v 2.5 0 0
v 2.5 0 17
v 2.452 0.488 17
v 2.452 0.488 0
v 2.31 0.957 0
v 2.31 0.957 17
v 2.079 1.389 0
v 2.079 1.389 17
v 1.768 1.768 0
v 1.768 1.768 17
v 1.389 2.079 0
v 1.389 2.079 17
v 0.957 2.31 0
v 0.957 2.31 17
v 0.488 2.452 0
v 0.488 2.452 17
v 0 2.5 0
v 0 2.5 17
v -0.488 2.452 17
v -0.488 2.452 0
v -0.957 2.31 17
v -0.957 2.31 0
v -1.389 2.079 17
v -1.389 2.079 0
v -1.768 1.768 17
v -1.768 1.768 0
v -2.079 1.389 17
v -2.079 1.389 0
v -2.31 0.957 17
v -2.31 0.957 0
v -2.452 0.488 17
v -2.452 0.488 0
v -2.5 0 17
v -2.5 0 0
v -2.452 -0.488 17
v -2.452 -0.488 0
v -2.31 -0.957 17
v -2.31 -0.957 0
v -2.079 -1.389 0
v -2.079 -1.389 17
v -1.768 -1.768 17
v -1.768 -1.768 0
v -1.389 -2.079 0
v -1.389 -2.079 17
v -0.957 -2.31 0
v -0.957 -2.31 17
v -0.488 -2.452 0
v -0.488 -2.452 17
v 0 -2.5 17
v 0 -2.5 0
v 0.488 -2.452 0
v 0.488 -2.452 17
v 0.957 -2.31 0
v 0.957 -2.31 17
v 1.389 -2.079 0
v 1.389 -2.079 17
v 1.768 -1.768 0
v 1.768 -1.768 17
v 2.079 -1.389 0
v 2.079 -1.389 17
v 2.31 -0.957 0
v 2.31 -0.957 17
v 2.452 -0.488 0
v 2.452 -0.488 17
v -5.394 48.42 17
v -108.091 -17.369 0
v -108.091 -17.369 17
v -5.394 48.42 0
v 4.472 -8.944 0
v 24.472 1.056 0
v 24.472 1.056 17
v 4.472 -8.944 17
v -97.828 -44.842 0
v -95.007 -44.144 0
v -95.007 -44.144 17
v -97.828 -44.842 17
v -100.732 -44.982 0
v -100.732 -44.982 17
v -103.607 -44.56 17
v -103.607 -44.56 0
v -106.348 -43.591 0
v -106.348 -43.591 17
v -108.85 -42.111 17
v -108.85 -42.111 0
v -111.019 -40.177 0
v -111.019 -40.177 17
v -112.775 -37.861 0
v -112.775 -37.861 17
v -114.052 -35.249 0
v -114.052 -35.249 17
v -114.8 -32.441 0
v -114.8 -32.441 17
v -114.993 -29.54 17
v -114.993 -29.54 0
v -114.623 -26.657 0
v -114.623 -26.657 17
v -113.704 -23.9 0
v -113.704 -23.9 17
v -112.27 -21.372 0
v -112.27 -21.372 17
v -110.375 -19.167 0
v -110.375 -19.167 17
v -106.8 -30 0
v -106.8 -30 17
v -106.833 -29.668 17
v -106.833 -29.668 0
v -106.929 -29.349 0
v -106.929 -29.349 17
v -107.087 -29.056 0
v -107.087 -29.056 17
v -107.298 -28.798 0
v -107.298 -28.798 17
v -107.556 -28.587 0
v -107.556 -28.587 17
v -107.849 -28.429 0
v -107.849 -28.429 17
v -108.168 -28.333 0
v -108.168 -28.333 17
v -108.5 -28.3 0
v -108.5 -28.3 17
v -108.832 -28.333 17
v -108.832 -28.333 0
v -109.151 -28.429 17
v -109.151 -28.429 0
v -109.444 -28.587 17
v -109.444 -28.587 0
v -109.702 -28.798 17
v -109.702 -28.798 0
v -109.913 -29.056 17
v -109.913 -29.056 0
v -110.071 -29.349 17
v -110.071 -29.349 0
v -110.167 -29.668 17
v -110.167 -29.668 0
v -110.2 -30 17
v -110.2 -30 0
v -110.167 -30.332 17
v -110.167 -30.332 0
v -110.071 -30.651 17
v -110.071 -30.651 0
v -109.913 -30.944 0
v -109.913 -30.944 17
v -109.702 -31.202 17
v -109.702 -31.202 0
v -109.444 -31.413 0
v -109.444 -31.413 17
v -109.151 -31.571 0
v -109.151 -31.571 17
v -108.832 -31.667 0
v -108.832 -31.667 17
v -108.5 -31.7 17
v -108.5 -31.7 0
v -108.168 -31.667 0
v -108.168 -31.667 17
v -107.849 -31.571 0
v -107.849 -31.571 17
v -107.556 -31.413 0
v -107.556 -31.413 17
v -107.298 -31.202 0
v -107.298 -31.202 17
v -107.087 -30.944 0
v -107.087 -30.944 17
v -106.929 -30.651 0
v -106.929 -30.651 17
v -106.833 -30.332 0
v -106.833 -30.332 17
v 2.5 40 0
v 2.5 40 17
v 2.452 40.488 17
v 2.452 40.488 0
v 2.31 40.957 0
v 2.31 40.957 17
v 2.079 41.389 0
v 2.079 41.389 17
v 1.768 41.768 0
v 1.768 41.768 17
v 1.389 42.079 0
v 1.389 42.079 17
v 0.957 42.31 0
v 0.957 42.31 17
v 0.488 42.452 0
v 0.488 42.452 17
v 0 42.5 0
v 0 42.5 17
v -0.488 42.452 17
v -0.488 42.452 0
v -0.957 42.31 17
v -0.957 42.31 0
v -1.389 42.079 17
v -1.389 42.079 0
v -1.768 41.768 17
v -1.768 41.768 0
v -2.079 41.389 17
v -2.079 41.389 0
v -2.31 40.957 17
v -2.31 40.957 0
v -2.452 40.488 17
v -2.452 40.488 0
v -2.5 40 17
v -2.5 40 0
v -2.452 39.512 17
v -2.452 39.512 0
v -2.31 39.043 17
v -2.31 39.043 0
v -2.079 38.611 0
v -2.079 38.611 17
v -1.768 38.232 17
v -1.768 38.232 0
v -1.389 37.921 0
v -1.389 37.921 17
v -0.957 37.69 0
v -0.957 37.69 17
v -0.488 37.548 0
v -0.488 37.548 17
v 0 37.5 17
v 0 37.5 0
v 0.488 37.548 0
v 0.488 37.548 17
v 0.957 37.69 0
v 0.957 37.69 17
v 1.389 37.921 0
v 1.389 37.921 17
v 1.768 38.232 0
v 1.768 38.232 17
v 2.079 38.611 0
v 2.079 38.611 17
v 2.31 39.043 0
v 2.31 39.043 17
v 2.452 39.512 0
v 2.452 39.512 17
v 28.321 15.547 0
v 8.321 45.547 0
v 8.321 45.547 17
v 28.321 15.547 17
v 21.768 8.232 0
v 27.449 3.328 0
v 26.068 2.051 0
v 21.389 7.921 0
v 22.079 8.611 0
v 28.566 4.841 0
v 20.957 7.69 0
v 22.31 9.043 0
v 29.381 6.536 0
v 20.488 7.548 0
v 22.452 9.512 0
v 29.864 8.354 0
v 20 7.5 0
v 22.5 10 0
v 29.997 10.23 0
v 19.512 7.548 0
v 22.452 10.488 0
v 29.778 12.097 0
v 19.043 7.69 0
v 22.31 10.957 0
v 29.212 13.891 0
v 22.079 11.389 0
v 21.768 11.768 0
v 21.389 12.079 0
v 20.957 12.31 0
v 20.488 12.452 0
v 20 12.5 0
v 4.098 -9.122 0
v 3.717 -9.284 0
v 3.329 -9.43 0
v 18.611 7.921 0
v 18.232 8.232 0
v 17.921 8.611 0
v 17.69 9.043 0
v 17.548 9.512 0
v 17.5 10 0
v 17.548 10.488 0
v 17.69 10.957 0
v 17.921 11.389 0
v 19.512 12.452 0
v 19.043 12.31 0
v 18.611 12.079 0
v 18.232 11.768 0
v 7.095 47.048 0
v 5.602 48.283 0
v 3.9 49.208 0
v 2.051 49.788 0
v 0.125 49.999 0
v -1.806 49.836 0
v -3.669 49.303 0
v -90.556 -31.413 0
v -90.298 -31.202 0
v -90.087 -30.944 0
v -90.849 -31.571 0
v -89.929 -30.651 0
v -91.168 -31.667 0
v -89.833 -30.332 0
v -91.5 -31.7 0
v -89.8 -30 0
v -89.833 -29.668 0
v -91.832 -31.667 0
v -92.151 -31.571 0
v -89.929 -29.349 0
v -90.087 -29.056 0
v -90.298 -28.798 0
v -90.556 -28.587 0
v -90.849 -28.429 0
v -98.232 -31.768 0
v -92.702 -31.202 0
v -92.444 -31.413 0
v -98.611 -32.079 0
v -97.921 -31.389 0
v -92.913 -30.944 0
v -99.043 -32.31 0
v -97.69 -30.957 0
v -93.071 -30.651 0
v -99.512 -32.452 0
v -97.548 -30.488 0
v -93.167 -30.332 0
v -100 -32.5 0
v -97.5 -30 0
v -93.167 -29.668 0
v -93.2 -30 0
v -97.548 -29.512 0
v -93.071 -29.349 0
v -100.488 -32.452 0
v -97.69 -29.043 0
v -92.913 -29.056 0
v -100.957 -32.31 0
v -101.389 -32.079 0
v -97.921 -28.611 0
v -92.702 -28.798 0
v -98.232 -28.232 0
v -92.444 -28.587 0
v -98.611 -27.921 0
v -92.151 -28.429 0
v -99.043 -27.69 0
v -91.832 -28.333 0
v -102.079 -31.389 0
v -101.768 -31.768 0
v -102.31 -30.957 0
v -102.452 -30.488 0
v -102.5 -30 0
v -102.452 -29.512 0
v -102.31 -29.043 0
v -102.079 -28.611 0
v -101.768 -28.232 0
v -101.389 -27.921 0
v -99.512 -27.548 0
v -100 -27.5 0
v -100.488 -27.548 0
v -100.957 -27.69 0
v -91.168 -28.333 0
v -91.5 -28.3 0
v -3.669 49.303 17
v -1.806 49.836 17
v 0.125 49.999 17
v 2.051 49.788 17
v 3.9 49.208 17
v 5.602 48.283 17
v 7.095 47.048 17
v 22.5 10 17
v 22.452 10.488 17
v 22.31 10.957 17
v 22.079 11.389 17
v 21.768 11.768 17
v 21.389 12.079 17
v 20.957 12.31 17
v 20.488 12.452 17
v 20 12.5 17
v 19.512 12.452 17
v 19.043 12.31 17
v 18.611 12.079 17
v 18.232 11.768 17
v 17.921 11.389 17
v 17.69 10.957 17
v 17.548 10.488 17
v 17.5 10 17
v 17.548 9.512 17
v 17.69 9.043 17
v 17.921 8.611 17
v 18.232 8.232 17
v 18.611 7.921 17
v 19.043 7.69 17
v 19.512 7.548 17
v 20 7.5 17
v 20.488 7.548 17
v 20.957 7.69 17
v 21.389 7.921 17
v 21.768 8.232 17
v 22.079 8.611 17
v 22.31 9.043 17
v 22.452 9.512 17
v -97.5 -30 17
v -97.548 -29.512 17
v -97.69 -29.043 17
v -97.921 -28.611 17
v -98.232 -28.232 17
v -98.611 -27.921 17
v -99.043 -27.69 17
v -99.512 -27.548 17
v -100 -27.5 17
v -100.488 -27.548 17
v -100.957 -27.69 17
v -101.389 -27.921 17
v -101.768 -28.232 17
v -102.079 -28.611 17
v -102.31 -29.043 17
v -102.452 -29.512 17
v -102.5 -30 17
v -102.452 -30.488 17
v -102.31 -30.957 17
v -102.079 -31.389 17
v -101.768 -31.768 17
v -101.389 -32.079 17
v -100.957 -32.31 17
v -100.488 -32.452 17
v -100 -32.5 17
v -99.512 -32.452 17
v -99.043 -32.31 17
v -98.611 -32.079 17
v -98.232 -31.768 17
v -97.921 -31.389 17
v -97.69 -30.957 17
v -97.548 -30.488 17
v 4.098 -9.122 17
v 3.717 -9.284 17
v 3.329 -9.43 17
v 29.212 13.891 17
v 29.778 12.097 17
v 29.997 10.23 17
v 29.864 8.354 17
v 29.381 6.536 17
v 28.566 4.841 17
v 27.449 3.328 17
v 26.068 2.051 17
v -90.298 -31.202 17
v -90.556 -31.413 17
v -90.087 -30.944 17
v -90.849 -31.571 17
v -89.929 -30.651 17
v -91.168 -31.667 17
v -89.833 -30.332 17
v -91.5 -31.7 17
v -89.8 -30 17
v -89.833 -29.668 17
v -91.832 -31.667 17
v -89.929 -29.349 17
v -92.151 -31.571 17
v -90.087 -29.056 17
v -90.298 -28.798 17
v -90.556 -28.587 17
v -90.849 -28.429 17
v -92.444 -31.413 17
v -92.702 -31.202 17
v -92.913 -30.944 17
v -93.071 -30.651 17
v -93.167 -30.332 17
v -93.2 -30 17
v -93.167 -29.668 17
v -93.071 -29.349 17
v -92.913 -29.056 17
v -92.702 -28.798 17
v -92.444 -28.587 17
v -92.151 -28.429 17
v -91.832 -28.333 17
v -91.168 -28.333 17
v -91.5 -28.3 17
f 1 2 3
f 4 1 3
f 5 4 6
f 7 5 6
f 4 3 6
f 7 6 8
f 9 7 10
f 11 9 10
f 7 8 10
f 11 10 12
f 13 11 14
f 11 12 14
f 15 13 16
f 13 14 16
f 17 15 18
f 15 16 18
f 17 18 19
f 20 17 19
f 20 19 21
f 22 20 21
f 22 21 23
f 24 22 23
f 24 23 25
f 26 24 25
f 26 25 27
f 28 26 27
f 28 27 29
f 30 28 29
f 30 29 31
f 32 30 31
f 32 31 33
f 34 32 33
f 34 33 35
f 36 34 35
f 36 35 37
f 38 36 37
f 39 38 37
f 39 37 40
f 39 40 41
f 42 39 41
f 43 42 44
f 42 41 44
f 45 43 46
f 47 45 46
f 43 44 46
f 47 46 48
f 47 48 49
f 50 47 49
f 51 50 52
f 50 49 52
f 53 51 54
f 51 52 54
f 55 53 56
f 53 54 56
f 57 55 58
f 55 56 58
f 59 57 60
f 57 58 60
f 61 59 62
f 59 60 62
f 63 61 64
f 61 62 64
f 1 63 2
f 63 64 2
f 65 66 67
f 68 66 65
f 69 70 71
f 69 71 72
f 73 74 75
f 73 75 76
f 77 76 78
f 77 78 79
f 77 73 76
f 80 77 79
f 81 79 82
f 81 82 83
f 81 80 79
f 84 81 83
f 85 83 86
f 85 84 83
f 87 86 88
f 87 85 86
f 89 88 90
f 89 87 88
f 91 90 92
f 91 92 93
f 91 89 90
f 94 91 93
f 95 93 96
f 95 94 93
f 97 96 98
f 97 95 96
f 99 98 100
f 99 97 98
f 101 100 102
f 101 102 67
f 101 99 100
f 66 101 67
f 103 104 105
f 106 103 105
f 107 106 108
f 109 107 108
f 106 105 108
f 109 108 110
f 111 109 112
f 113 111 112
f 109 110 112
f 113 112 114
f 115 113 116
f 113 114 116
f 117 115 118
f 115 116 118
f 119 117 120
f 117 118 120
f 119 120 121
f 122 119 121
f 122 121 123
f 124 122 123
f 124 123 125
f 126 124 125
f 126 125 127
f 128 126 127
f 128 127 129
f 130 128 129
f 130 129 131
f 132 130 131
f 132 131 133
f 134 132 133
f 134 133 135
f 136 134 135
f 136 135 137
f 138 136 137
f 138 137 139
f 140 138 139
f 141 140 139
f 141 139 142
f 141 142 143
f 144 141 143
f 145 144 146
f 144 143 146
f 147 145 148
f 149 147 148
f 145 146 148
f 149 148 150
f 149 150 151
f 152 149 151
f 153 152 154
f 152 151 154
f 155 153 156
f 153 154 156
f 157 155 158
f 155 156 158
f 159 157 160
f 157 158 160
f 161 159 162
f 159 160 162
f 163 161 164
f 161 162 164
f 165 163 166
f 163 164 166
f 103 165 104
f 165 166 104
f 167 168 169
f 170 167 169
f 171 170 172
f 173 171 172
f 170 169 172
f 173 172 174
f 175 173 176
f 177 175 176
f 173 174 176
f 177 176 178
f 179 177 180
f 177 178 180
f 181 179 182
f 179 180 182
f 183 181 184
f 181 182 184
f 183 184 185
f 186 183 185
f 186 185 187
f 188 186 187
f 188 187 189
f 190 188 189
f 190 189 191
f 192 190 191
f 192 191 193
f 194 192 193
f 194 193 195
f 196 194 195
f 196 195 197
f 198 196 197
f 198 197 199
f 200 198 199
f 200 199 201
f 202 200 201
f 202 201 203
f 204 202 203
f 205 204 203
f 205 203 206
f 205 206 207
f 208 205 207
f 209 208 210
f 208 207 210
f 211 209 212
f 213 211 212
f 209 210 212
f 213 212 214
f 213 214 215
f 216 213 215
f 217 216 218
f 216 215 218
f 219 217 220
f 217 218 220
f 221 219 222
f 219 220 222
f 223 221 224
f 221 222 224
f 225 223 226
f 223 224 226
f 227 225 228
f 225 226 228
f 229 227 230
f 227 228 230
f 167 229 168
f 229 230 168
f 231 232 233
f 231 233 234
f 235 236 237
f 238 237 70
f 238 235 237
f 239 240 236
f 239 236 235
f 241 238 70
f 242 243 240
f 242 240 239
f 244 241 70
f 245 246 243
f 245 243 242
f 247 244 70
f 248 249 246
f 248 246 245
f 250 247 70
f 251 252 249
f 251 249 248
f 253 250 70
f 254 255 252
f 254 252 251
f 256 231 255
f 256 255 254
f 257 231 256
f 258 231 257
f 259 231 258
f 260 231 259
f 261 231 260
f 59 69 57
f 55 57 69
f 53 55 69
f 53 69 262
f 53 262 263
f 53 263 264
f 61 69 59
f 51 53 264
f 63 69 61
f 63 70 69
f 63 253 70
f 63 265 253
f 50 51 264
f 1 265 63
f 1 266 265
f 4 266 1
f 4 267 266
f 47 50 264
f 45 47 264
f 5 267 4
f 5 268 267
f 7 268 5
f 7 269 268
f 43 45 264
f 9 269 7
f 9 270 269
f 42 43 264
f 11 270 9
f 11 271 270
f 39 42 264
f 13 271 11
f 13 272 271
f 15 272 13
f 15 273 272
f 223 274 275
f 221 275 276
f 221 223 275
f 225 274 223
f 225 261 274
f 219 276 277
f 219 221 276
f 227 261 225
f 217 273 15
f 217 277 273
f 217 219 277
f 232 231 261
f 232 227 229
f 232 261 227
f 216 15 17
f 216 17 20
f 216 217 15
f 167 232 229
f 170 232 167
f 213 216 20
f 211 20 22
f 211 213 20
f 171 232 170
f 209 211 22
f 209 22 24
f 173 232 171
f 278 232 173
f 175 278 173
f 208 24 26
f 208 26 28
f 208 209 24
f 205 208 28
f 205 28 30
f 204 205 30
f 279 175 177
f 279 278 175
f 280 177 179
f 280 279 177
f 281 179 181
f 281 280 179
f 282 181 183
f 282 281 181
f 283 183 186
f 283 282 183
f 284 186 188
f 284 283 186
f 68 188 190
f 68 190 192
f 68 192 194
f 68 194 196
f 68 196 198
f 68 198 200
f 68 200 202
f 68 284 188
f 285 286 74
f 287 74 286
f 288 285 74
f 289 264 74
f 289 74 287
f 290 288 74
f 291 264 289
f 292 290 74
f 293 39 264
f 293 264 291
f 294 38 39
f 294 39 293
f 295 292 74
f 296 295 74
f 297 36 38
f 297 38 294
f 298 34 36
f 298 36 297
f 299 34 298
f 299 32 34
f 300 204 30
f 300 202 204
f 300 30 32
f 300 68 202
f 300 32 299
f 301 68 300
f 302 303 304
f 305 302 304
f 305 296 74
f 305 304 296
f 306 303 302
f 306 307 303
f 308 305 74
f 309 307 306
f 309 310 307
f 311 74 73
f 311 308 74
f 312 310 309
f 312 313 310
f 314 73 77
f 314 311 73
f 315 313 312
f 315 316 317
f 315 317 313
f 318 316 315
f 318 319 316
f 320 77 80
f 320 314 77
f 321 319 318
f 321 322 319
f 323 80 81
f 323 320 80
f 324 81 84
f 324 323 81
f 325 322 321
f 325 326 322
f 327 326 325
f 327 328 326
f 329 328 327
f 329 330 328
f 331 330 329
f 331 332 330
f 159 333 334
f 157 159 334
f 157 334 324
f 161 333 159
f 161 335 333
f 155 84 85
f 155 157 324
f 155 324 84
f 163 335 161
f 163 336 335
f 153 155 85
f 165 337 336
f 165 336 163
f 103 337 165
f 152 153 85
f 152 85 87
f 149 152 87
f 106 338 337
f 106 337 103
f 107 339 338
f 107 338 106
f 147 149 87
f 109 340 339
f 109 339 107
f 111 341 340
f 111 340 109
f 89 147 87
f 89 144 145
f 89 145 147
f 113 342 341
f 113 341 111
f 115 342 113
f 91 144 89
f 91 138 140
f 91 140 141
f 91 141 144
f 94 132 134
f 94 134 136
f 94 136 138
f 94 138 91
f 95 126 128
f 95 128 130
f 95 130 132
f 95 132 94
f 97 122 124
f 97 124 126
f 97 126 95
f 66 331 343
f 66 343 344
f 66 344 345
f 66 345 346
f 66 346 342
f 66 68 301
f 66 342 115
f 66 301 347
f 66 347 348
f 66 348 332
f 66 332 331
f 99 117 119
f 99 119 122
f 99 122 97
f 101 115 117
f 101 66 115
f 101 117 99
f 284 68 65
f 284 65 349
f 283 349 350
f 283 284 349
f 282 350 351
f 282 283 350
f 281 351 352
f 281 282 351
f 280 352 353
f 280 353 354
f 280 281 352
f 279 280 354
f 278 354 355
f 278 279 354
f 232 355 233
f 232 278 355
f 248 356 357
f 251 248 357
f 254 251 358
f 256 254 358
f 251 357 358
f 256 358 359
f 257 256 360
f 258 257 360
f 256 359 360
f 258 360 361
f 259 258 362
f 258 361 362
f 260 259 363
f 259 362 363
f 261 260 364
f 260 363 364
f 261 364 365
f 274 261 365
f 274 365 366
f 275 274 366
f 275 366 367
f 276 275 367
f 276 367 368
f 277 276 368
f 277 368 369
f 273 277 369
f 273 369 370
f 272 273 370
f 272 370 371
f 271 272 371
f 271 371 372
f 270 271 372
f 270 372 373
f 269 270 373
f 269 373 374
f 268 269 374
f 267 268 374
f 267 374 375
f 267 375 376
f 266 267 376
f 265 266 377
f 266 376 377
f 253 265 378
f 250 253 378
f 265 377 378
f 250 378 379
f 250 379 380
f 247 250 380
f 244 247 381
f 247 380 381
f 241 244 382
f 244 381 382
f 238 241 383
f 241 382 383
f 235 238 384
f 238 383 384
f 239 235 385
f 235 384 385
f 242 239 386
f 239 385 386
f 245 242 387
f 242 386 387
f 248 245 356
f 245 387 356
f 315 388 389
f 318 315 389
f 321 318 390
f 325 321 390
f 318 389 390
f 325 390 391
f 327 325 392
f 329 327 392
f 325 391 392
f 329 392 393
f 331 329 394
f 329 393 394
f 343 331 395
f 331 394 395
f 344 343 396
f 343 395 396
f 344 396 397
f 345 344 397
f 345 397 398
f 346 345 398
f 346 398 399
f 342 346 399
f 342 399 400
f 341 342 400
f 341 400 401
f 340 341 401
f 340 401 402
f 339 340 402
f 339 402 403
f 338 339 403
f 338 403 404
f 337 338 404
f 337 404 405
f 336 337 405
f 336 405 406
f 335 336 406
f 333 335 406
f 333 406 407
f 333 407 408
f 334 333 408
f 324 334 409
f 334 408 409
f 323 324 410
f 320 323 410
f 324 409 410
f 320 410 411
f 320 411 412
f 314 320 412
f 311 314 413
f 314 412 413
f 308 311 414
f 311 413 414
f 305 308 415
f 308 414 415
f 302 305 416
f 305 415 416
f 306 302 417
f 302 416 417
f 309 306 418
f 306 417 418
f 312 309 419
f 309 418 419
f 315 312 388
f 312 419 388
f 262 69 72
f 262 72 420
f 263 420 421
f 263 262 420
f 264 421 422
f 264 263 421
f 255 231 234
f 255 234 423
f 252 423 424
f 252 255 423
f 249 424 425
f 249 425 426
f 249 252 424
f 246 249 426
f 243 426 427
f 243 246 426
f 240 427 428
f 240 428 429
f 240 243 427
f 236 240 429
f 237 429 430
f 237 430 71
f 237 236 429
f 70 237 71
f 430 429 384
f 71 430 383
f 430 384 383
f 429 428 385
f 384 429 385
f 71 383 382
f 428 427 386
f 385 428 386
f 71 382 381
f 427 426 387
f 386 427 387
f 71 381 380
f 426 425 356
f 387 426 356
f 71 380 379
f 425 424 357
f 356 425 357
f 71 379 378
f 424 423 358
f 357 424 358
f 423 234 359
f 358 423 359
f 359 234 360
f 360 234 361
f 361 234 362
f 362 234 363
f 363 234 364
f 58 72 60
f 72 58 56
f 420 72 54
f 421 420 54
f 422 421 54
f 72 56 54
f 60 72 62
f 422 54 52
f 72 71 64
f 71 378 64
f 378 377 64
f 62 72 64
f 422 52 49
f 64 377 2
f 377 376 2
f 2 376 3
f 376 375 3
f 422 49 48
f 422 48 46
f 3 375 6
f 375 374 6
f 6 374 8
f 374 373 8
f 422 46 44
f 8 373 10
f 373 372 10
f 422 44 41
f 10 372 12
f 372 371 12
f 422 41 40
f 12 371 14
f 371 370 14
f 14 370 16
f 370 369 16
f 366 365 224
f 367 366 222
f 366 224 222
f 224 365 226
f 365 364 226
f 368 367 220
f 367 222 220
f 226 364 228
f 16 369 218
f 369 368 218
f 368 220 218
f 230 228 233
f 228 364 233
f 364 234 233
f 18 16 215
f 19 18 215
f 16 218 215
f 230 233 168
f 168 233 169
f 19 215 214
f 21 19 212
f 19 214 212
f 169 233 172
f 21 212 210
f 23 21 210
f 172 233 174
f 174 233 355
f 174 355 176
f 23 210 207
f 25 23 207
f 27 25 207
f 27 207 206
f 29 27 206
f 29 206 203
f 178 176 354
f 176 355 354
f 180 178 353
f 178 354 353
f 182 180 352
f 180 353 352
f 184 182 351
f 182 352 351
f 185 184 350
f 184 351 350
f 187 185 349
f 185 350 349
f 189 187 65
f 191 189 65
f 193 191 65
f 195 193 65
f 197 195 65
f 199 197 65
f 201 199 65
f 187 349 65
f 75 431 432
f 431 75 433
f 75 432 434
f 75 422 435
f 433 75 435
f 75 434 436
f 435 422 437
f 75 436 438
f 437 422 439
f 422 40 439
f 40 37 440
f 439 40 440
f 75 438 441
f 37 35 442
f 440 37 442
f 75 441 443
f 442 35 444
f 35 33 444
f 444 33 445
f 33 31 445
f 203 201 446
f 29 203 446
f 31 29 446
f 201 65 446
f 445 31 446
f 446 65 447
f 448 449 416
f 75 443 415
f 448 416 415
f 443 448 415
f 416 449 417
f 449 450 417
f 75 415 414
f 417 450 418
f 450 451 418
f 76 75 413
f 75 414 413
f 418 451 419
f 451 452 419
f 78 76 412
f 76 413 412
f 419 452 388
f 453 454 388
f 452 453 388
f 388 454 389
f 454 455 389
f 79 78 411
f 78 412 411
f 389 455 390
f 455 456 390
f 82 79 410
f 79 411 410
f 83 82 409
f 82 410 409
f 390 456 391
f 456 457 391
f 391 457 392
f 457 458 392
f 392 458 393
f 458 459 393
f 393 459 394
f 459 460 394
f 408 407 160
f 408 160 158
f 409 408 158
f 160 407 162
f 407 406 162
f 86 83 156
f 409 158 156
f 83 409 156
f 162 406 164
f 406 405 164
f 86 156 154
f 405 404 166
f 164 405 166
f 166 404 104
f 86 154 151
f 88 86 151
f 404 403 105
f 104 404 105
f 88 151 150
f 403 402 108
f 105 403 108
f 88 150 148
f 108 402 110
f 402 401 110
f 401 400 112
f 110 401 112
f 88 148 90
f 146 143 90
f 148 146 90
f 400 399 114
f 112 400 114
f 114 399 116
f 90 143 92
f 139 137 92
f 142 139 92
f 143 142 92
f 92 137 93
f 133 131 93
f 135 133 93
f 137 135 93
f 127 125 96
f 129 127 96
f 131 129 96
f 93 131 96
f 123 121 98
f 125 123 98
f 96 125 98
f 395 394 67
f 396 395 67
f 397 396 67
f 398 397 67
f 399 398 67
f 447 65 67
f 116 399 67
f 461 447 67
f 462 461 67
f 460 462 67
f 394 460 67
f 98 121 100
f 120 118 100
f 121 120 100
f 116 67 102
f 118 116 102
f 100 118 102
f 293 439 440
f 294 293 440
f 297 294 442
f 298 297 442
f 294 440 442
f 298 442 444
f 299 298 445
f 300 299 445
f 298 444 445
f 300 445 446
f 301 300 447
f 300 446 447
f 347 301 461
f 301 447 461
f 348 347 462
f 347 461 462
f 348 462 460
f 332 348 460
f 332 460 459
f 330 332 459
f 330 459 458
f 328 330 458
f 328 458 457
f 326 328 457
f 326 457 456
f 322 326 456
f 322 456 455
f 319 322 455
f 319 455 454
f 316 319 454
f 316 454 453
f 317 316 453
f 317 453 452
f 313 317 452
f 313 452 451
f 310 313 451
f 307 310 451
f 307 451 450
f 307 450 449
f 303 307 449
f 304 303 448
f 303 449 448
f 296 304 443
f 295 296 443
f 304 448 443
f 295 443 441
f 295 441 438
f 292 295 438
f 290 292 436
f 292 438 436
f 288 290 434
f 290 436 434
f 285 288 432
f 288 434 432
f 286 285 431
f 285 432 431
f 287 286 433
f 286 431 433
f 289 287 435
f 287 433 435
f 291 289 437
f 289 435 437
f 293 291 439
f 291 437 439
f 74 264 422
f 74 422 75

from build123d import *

# Parameters (mm, degrees)
BOSS_EXTRUDE1_DEPTH = 17
SKETCH2_R           = 2.5
CUT_EXTRUDE1_DEPTH  = 127.546434165
SKETCH3_R           = 1.7
CUT_EXTRUDE2_DEPTH  = 127.546434165


with BuildPart() as part:
    # Sketch1 → Boss-Extrude1 (new body)
    with BuildSketch(Plane.XY):
        with BuildLine():
            Line((3.328897286, -9.429657621), (-95.00665407, -44.144486432))
            ThreePointArc((-95.00665407, -44.144486432), (-113.476816743, -36.586001098), (-108.091360043, -17.369485653))
            Line((-108.091360043, -17.369485653), (-5.394240028, 48.420342898))
            ThreePointArc((-5.394240028, 48.420342898), (2.050554972, 49.787503477), (8.320502943, 45.547001962))
            Line((8.320502943, 45.547001962), (28.320502943, 15.547001962))
            ThreePointArc((28.320502943, 15.547001962), (29.664996488, 7.433320648), (24.472135955, 1.05572809))
            Line((24.472135955, 1.05572809), (4.472135955, -8.94427191))
            ThreePointArc((4.472135955, -8.94427191), (3.908059586, -9.204730863), (3.328897286, -9.429657621))
        make_face()
    extrude(amount=BOSS_EXTRUDE1_DEPTH)

    # Sketch2 → Cut-Extrude1 (cut, through all)
    with BuildSketch(Plane.XY.offset(17)):
        with Locations((-100, -30)):
            Circle(SKETCH2_R)
        Circle(SKETCH2_R)
        with Locations((0, 40)):
            Circle(SKETCH2_R)
        with Locations((20, 10)):
            Circle(SKETCH2_R)
    extrude(amount=-CUT_EXTRUDE1_DEPTH, mode=Mode.SUBTRACT)

    # Sketch3 → Cut-Extrude2 (cut, through all)
    with BuildSketch(Plane.XY.offset(17)):
        with Locations((-108.5, -30)):
            Circle(SKETCH3_R)
        with Locations((-91.5, -30)):
            Circle(SKETCH3_R)
    extrude(amount=-CUT_EXTRUDE2_DEPTH, mode=Mode.SUBTRACT)


solid = part.part
